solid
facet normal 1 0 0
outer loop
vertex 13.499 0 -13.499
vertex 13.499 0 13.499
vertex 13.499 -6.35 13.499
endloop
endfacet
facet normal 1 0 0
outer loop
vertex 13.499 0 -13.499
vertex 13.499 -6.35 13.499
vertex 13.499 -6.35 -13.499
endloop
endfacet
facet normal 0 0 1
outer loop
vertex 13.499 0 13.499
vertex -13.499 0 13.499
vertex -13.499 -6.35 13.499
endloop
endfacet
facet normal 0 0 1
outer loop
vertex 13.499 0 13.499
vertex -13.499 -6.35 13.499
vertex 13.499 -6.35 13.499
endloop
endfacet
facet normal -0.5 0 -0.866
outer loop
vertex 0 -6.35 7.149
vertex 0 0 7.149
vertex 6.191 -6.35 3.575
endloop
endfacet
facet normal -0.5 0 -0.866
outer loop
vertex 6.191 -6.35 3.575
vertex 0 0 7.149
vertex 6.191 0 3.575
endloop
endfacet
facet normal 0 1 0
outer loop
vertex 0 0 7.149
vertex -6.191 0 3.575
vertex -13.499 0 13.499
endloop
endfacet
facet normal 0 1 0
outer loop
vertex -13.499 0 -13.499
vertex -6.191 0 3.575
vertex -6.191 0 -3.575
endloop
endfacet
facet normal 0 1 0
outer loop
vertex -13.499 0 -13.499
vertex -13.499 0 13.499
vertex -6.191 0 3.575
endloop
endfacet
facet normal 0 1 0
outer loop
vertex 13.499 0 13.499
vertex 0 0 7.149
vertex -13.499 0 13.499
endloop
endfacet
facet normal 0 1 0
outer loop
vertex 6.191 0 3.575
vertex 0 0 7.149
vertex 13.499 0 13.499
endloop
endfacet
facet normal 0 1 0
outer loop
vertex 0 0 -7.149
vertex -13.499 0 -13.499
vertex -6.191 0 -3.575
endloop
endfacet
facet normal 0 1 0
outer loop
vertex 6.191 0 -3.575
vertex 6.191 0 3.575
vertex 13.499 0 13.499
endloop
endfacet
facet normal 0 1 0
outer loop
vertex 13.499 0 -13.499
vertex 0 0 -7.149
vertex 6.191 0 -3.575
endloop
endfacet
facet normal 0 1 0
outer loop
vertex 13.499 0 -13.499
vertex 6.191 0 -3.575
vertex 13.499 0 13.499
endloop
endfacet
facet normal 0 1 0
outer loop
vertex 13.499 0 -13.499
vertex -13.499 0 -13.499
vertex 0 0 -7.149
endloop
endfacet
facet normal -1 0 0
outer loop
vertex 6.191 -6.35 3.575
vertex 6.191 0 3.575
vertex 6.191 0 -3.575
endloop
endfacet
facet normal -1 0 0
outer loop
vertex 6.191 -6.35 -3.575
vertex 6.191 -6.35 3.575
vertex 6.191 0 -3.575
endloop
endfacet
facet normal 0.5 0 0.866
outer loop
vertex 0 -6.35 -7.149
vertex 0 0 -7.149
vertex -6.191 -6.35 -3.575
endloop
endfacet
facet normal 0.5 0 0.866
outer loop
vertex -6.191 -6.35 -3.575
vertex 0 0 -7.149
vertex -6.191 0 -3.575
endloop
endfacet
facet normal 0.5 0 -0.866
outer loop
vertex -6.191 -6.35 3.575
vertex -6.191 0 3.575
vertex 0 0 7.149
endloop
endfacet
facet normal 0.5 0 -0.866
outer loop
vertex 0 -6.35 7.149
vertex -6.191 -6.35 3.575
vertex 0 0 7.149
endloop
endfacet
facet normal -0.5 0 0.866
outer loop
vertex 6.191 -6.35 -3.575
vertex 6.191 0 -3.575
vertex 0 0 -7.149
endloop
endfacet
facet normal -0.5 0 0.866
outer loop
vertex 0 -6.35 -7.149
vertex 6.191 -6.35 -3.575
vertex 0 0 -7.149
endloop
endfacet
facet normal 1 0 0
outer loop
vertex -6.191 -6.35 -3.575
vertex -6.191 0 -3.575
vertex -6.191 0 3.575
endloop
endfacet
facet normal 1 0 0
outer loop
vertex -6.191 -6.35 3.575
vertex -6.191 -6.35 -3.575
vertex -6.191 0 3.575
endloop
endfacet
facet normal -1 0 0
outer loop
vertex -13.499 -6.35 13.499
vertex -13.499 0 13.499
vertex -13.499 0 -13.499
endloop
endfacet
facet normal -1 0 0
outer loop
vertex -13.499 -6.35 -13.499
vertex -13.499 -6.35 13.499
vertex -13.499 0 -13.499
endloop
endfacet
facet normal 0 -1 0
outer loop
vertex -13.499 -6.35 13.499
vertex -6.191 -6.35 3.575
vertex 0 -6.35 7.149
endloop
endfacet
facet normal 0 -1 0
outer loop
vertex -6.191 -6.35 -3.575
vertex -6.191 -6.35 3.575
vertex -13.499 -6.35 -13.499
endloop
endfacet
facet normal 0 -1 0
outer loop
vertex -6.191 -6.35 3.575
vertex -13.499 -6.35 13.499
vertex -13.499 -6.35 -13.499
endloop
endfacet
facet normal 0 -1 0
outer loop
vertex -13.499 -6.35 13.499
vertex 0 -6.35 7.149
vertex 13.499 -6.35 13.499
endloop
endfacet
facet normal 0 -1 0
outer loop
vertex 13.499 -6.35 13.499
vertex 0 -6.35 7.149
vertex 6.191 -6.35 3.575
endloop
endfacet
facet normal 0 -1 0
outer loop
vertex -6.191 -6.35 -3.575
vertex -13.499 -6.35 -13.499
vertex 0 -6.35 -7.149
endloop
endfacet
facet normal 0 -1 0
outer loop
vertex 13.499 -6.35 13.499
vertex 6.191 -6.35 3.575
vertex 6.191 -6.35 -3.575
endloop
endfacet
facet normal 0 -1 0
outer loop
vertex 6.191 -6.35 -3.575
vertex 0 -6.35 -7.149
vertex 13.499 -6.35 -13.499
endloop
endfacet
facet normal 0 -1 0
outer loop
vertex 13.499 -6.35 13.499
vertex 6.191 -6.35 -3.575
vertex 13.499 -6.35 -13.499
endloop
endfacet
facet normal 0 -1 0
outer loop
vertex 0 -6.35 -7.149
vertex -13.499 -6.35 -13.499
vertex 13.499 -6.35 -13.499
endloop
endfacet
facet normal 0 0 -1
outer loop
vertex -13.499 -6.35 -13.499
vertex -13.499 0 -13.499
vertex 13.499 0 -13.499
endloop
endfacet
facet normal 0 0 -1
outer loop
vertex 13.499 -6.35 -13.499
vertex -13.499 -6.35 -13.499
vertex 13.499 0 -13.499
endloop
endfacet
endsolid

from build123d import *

# Parameters (mm, degrees)
SKETCH1_W           = 26.998079416
SKETCH1_H           = 26.998079416
BOSS_EXTRUDE1_DEPTH = 6.35


with BuildPart() as part:
    # Sketch1 → Boss-Extrude1 (new body)
    with BuildSketch(Plane(origin=(0, 0, 0), x_dir=(1, 0, 0), z_dir=(0, 1, 0))):
        Rectangle(SKETCH1_W, SKETCH1_H)
        Polygon((6.19125, 3.574519854), (0, 7.149039708), (-6.19125, 3.574519854), (-6.19125, -3.574519854), (0, -7.149039708), (6.19125, -3.574519854), align=None, mode=Mode.SUBTRACT)
    extrude(amount=-BOSS_EXTRUDE1_DEPTH)


solid = part.part
